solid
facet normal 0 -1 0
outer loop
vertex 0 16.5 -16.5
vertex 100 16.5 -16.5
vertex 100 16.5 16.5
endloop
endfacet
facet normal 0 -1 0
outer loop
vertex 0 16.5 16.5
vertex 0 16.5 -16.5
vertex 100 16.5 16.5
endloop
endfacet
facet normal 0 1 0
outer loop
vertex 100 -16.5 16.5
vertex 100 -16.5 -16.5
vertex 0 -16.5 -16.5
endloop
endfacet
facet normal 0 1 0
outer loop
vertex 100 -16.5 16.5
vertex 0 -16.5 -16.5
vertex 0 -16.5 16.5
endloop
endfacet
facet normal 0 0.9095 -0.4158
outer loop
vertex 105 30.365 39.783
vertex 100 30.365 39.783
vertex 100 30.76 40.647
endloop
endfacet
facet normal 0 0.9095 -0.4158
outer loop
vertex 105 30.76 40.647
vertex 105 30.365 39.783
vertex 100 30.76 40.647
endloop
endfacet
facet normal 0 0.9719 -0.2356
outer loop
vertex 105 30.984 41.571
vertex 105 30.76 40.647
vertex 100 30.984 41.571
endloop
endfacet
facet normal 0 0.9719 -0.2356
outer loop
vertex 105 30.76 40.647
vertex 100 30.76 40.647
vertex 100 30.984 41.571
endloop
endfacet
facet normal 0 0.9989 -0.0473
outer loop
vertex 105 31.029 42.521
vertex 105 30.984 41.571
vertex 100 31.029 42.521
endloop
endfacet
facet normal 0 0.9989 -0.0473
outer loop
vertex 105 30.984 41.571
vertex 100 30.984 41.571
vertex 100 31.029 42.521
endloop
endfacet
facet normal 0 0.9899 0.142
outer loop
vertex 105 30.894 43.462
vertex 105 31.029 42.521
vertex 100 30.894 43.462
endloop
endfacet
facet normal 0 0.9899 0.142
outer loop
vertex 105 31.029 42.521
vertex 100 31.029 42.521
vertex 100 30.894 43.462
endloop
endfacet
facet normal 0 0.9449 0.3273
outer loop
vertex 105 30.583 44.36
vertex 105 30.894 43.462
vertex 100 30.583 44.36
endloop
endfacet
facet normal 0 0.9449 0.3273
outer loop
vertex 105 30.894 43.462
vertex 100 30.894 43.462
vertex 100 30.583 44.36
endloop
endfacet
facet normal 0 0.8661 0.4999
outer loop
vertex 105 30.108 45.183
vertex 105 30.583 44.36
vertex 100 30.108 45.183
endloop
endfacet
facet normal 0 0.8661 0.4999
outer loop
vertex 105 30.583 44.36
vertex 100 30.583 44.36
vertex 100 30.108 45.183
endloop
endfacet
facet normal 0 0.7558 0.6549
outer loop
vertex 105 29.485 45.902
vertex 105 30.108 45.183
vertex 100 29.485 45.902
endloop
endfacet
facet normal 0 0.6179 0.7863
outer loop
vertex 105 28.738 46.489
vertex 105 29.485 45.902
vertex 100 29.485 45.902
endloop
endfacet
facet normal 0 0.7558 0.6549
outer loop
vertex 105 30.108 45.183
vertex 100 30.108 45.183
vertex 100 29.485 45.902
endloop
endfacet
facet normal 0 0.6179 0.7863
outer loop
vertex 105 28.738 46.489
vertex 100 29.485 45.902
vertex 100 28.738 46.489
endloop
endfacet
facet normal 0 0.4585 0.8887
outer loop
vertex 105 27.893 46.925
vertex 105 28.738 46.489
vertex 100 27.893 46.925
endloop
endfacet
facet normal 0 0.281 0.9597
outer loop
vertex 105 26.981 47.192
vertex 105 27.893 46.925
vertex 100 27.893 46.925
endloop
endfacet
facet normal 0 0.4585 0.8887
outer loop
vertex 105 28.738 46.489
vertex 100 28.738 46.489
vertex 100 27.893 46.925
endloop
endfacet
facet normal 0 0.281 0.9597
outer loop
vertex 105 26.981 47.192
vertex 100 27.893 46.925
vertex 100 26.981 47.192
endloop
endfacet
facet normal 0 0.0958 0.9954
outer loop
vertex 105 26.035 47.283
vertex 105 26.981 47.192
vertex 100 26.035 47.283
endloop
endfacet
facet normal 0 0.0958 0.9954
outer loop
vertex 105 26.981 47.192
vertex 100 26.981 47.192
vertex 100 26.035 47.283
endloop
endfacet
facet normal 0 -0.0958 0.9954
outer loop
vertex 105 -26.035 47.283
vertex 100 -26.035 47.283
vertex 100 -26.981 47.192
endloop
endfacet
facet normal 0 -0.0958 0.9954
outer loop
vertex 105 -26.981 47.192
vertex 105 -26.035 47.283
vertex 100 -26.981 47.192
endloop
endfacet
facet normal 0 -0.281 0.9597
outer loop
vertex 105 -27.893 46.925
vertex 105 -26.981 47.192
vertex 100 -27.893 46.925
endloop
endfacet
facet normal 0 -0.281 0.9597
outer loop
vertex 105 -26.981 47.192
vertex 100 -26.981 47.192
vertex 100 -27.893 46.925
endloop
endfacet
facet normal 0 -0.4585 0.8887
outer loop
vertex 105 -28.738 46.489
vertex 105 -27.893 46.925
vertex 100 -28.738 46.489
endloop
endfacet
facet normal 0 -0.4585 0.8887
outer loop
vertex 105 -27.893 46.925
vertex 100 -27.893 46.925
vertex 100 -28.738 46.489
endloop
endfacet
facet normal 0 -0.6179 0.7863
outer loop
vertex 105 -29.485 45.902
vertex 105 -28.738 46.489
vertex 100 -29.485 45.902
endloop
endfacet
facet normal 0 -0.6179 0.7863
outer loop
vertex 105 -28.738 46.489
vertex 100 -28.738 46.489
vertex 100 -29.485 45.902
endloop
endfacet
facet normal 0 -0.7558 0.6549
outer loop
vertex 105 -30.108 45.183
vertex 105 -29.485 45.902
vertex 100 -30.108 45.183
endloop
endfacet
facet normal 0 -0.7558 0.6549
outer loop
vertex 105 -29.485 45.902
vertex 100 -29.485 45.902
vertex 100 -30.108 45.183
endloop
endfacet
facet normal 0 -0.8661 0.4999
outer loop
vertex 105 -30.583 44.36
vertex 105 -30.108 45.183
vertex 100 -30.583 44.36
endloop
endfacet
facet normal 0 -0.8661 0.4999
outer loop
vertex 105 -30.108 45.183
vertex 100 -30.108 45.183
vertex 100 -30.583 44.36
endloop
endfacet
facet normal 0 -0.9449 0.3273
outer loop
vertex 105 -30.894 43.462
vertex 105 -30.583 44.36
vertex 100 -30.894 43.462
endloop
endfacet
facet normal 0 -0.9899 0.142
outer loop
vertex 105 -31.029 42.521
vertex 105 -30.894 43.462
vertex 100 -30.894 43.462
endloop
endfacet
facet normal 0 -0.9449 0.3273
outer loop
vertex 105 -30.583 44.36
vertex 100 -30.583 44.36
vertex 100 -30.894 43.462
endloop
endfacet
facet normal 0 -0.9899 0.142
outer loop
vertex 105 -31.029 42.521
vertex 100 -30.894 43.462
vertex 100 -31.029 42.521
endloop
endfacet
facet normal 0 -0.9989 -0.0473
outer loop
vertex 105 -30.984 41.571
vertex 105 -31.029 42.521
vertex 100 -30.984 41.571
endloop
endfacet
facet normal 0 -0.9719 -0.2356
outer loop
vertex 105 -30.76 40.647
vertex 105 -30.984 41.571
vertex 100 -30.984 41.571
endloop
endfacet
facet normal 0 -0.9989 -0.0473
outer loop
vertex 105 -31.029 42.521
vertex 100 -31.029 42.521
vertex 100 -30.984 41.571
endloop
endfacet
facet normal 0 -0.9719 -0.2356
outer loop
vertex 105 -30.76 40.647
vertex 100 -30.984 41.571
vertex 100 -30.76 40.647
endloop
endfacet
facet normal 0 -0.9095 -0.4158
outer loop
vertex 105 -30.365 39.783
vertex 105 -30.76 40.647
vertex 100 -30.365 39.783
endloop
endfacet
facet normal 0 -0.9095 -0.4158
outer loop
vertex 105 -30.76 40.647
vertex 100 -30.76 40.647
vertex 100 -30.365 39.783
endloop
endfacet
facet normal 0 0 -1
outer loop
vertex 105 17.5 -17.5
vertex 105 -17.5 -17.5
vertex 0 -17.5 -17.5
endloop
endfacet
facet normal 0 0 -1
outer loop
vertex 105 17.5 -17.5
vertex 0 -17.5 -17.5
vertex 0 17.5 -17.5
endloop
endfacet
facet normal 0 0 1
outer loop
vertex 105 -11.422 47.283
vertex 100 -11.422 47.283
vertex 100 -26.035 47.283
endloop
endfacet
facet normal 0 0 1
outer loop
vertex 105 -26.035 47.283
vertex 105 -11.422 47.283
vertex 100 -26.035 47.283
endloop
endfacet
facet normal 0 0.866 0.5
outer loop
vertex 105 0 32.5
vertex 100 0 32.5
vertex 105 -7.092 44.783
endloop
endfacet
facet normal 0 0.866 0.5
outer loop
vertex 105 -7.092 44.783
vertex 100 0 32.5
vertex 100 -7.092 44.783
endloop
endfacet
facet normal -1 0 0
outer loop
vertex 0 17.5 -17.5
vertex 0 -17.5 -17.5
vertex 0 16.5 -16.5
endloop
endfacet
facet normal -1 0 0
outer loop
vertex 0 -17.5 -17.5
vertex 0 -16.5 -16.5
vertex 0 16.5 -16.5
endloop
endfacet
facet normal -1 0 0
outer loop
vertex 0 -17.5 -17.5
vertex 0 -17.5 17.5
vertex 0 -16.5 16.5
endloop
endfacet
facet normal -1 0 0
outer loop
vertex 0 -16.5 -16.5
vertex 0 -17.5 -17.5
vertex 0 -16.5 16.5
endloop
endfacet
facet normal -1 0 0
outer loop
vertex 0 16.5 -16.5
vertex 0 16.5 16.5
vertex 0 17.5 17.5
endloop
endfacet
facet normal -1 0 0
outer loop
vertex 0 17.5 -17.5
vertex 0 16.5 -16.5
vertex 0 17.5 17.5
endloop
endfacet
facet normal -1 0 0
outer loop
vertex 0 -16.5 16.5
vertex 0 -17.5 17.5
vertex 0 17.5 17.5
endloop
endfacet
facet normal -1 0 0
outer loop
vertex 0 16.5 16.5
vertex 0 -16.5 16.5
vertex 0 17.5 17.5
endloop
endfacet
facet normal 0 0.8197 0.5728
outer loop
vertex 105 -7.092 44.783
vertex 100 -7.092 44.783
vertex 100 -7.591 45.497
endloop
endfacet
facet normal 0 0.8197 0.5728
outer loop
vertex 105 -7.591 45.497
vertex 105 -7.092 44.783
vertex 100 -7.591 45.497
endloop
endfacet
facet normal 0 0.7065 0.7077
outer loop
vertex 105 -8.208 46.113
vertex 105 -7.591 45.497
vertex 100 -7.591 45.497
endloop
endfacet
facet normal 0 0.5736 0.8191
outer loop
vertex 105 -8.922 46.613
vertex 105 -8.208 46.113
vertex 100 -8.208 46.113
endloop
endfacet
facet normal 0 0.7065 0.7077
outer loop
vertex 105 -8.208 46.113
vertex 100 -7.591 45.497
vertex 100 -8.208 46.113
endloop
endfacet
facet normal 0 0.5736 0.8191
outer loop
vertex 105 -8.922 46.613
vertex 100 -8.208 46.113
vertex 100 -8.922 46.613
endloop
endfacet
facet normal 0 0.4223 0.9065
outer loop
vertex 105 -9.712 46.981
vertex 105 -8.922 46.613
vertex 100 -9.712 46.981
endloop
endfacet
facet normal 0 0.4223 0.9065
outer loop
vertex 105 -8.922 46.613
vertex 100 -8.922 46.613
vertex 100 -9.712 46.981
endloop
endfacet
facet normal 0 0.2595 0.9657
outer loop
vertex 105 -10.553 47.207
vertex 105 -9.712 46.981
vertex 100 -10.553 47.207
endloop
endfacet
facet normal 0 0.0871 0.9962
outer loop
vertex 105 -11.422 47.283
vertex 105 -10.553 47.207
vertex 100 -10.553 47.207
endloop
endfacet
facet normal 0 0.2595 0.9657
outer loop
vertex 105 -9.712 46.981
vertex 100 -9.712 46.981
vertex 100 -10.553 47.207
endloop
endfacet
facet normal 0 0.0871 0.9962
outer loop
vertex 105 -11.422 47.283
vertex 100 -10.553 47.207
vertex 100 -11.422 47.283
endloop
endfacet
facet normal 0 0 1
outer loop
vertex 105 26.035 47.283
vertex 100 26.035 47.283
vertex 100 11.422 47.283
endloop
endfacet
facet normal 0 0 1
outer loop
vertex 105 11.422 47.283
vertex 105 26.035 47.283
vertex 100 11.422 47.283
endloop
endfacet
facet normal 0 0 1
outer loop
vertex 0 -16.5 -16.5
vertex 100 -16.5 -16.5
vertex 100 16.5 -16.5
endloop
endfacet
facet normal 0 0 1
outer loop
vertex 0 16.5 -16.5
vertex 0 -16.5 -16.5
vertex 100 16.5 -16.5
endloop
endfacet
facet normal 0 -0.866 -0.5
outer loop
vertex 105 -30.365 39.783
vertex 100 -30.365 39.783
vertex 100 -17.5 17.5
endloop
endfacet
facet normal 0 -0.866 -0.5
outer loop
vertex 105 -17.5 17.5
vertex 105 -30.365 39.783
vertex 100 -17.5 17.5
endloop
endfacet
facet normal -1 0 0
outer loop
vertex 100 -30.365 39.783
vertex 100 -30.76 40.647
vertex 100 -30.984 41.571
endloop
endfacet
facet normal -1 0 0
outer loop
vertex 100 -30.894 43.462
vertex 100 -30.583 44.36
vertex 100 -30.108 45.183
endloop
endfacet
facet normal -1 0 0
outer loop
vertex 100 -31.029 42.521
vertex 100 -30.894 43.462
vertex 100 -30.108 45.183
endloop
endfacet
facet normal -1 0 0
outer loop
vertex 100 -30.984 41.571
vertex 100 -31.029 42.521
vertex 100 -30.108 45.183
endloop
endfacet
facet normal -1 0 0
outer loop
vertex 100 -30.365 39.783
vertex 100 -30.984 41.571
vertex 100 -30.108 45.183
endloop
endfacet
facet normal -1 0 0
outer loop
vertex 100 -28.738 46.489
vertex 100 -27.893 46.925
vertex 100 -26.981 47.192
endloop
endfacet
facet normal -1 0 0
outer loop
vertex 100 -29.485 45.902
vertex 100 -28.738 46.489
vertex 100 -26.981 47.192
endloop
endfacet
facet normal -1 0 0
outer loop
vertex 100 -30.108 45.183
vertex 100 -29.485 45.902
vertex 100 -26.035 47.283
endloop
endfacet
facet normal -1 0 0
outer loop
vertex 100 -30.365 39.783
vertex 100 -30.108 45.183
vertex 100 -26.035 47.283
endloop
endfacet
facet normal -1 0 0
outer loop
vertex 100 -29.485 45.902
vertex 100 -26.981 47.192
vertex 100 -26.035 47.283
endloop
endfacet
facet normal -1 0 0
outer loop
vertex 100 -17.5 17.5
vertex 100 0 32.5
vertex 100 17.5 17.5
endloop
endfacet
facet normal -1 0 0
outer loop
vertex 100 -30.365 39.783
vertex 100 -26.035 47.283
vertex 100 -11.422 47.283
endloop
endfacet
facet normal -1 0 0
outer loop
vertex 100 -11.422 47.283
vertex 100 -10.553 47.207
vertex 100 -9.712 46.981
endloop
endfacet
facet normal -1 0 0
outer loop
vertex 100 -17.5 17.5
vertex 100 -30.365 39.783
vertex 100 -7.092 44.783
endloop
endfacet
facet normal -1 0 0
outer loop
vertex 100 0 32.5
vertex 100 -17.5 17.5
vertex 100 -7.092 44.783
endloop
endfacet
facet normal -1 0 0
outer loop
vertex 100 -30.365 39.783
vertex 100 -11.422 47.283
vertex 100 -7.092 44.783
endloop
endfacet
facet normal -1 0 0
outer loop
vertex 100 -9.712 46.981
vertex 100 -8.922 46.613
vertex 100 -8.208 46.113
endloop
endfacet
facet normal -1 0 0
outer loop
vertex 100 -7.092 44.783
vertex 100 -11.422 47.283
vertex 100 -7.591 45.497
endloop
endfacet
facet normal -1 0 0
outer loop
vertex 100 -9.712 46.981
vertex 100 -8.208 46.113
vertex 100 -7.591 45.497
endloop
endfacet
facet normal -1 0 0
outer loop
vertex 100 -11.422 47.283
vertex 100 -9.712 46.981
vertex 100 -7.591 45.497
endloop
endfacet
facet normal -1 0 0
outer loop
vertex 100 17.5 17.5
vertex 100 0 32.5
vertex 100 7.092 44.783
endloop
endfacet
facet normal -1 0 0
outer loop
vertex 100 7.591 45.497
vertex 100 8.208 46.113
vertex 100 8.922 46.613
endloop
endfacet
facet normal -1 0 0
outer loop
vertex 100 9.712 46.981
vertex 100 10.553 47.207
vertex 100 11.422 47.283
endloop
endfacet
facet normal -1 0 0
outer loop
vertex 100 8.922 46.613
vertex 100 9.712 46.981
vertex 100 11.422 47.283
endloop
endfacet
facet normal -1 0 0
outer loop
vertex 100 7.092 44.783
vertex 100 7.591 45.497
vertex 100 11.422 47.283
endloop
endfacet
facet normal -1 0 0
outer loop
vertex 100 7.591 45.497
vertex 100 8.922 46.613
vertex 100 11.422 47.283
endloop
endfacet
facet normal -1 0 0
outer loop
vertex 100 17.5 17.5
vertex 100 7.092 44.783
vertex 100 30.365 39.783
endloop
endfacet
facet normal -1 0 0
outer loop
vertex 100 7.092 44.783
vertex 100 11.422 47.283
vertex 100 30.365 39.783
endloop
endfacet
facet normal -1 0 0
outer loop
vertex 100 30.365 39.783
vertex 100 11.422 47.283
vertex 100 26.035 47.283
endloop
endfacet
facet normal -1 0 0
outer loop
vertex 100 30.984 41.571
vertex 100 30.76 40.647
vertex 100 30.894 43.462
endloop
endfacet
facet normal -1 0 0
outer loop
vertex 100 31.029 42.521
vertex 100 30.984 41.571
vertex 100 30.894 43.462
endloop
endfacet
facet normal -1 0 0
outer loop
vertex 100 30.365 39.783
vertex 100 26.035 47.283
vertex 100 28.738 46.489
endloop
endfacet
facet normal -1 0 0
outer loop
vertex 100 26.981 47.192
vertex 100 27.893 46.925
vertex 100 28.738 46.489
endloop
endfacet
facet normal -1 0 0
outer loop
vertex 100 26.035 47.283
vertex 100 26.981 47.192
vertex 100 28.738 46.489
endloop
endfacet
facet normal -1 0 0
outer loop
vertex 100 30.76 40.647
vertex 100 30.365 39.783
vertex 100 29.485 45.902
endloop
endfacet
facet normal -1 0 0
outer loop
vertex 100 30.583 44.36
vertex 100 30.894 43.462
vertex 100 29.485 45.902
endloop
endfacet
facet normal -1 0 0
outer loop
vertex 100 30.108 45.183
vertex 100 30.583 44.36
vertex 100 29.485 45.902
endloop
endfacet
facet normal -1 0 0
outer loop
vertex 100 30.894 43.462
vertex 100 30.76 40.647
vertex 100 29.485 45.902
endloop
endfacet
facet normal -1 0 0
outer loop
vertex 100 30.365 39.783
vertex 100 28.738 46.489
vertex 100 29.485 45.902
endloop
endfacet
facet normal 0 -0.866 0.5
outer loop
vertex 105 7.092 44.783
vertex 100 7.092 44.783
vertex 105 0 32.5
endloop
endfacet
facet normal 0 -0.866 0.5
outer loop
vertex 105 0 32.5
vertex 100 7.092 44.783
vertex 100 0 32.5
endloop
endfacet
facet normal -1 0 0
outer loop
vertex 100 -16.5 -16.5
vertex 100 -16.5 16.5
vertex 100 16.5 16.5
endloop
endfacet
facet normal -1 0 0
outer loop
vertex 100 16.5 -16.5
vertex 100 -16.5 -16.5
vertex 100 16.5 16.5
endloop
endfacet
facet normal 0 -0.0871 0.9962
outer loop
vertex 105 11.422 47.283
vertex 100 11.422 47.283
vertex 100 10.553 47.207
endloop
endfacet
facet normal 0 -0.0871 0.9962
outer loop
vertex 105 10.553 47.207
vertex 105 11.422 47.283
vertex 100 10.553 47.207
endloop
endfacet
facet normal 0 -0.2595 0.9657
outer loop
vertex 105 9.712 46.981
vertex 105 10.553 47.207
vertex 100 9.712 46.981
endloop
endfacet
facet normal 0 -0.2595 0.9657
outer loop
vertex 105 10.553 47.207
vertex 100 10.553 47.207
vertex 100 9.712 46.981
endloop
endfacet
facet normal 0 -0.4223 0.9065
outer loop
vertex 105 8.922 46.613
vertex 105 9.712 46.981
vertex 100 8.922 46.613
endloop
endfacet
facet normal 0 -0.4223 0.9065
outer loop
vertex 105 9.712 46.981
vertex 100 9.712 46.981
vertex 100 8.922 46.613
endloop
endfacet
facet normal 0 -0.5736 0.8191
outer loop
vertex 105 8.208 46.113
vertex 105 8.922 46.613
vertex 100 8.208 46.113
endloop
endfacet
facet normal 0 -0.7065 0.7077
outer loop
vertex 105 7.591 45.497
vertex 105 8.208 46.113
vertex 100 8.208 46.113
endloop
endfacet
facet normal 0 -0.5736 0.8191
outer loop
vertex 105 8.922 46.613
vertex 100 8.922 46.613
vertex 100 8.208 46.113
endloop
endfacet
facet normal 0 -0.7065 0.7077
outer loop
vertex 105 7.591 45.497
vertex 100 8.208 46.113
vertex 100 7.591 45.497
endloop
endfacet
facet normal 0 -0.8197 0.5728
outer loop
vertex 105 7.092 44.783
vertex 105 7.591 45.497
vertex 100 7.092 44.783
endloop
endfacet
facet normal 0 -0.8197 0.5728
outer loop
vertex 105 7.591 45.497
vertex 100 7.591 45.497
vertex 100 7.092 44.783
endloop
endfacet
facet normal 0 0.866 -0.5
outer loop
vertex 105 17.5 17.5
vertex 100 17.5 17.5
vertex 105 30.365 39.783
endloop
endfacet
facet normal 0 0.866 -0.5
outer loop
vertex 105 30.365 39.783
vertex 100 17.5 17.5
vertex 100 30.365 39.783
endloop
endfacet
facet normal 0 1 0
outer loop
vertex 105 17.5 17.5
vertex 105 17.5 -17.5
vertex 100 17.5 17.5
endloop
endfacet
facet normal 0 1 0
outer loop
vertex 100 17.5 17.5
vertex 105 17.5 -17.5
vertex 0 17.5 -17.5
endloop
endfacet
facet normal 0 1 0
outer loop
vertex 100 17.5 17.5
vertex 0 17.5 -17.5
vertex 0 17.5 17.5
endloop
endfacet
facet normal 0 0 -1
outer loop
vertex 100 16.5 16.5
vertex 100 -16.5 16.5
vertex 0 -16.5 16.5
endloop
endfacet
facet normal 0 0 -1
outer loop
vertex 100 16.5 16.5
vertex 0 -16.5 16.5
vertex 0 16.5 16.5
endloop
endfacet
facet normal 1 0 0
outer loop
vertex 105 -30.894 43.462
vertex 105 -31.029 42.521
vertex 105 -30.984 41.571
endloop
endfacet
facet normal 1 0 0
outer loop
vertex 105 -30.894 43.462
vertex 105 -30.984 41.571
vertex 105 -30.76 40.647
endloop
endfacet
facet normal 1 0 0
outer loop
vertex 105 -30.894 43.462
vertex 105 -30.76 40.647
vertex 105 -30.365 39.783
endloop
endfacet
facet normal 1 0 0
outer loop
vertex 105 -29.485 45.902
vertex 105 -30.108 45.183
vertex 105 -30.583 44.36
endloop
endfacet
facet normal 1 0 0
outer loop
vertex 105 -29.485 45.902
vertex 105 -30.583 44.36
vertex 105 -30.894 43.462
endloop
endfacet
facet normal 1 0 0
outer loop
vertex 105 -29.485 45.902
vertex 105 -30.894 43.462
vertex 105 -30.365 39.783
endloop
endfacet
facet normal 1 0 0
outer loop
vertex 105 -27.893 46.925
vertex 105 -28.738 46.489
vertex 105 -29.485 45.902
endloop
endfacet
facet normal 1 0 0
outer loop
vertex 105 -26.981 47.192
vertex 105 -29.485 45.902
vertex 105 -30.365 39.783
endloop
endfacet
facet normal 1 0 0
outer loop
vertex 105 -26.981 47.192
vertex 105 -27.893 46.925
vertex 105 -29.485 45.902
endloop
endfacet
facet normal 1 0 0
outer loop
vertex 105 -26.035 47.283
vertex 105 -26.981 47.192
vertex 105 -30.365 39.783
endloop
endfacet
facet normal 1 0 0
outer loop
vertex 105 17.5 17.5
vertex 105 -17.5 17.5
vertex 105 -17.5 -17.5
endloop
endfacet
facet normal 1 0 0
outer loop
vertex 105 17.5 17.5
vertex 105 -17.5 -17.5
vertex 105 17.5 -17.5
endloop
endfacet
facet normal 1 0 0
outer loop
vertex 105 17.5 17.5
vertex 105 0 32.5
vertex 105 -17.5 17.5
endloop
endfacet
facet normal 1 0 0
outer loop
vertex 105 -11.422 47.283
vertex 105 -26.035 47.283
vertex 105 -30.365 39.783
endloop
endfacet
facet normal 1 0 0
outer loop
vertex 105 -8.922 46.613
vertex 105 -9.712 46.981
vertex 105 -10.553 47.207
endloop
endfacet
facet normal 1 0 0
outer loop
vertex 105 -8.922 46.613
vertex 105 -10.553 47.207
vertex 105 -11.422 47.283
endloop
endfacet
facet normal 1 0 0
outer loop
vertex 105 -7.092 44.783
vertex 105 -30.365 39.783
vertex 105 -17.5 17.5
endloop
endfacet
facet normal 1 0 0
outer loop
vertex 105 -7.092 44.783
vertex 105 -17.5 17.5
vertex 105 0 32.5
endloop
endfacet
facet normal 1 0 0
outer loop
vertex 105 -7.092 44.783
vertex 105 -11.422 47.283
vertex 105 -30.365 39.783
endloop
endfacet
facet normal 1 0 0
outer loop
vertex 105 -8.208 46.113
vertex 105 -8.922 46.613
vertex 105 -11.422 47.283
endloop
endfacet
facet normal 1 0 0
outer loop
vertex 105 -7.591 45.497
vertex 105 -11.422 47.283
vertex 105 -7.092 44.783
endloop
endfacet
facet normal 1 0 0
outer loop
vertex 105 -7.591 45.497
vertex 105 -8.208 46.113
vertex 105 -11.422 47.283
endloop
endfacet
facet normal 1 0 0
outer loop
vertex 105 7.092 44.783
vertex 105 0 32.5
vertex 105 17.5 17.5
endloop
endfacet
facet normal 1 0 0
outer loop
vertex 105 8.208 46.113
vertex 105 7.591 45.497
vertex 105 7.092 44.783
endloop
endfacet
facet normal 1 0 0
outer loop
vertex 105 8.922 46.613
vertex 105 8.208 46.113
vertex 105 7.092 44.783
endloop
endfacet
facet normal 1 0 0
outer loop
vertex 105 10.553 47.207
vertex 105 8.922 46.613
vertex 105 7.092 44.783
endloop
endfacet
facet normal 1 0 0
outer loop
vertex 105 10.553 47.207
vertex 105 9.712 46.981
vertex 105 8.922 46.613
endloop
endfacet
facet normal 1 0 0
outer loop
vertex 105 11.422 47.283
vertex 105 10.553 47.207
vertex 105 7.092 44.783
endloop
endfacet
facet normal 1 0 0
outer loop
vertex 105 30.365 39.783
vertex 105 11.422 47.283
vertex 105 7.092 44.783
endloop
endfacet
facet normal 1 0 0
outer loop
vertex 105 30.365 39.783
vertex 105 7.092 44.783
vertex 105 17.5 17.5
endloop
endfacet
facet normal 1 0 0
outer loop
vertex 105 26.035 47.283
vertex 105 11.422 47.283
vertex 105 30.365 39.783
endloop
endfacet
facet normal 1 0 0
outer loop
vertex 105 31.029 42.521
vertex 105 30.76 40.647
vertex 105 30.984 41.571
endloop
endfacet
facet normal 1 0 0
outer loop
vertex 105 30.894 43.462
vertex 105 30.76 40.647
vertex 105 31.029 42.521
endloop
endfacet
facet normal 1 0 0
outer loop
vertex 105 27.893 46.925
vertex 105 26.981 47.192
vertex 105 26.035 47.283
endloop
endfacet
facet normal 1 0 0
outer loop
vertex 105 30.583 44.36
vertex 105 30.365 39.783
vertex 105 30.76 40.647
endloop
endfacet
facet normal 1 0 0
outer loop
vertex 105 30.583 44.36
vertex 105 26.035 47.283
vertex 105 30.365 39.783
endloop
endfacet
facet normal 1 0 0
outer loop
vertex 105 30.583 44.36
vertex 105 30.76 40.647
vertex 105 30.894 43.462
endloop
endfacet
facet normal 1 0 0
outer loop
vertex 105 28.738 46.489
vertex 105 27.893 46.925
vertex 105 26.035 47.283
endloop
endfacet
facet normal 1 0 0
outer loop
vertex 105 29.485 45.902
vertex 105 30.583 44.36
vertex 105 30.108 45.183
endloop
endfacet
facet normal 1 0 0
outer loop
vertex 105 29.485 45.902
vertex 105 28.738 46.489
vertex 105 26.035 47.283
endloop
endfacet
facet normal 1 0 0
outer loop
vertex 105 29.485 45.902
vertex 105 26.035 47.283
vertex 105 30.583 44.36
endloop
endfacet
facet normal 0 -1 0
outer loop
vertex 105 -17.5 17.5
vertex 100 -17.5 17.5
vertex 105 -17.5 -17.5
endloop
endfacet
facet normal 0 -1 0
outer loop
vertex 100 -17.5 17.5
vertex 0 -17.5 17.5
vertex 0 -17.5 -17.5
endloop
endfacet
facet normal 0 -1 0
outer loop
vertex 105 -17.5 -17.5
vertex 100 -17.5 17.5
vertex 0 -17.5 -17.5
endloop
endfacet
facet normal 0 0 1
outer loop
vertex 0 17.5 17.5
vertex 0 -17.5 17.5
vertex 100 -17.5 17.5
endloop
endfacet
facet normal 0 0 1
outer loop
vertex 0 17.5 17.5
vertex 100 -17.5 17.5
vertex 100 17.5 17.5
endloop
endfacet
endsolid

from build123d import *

# Parameters (mm, degrees)
F0_W     = 35
F0_H     = 35
F0_W_2   = 33
F0_H_2   = 33
F1_DEPTH = 100
F3_DEPTH = 5


with BuildPart() as f1:
    # F0 (on Right) → F1 (new body)
    with BuildSketch(Plane.YZ):
        Rectangle(F0_W, F0_H)
        Rectangle(F0_W_2, F0_H_2, mode=Mode.SUBTRACT)
    extrude(amount=F1_DEPTH)

    # F2 (on face) → F3 (join)
    with BuildSketch(Plane.YZ.offset(100)):
        with BuildLine():
            Line((-17.5, 17.5), (-17.5, -17.5))
            Line((-17.5, -17.5), (17.5, -17.5))
            Line((17.5, -17.5), (17.5, 17.5))
            Line((17.5, 17.5), (30.365003, 39.782839))
            ThreePointArc((30.365003, 39.782839), (30.365003, 44.782839), (26.034876, 47.282839))
            Line((26.034876, 47.282839), (11.421628, 47.282839))
            ThreePointArc((11.421628, 47.282839), (8.921628, 46.612966), (7.0915, 44.782839))
            Line((7.0915, 44.782839), (0, 32.5))
            Line((0, 32.5), (-7.0915, 44.782839))
            ThreePointArc((-7.0915, 44.782839), (-8.921628, 46.612966), (-11.421628, 47.282839))
            Line((-11.421628, 47.282839), (-26.034876, 47.282839))
            ThreePointArc((-26.034876, 47.282839), (-30.365003, 44.782839), (-30.365003, 39.782839))
            Line((-30.365003, 39.782839), (-17.5, 17.5))
        make_face()
    extrude(amount=F3_DEPTH)


solid = f1.part
